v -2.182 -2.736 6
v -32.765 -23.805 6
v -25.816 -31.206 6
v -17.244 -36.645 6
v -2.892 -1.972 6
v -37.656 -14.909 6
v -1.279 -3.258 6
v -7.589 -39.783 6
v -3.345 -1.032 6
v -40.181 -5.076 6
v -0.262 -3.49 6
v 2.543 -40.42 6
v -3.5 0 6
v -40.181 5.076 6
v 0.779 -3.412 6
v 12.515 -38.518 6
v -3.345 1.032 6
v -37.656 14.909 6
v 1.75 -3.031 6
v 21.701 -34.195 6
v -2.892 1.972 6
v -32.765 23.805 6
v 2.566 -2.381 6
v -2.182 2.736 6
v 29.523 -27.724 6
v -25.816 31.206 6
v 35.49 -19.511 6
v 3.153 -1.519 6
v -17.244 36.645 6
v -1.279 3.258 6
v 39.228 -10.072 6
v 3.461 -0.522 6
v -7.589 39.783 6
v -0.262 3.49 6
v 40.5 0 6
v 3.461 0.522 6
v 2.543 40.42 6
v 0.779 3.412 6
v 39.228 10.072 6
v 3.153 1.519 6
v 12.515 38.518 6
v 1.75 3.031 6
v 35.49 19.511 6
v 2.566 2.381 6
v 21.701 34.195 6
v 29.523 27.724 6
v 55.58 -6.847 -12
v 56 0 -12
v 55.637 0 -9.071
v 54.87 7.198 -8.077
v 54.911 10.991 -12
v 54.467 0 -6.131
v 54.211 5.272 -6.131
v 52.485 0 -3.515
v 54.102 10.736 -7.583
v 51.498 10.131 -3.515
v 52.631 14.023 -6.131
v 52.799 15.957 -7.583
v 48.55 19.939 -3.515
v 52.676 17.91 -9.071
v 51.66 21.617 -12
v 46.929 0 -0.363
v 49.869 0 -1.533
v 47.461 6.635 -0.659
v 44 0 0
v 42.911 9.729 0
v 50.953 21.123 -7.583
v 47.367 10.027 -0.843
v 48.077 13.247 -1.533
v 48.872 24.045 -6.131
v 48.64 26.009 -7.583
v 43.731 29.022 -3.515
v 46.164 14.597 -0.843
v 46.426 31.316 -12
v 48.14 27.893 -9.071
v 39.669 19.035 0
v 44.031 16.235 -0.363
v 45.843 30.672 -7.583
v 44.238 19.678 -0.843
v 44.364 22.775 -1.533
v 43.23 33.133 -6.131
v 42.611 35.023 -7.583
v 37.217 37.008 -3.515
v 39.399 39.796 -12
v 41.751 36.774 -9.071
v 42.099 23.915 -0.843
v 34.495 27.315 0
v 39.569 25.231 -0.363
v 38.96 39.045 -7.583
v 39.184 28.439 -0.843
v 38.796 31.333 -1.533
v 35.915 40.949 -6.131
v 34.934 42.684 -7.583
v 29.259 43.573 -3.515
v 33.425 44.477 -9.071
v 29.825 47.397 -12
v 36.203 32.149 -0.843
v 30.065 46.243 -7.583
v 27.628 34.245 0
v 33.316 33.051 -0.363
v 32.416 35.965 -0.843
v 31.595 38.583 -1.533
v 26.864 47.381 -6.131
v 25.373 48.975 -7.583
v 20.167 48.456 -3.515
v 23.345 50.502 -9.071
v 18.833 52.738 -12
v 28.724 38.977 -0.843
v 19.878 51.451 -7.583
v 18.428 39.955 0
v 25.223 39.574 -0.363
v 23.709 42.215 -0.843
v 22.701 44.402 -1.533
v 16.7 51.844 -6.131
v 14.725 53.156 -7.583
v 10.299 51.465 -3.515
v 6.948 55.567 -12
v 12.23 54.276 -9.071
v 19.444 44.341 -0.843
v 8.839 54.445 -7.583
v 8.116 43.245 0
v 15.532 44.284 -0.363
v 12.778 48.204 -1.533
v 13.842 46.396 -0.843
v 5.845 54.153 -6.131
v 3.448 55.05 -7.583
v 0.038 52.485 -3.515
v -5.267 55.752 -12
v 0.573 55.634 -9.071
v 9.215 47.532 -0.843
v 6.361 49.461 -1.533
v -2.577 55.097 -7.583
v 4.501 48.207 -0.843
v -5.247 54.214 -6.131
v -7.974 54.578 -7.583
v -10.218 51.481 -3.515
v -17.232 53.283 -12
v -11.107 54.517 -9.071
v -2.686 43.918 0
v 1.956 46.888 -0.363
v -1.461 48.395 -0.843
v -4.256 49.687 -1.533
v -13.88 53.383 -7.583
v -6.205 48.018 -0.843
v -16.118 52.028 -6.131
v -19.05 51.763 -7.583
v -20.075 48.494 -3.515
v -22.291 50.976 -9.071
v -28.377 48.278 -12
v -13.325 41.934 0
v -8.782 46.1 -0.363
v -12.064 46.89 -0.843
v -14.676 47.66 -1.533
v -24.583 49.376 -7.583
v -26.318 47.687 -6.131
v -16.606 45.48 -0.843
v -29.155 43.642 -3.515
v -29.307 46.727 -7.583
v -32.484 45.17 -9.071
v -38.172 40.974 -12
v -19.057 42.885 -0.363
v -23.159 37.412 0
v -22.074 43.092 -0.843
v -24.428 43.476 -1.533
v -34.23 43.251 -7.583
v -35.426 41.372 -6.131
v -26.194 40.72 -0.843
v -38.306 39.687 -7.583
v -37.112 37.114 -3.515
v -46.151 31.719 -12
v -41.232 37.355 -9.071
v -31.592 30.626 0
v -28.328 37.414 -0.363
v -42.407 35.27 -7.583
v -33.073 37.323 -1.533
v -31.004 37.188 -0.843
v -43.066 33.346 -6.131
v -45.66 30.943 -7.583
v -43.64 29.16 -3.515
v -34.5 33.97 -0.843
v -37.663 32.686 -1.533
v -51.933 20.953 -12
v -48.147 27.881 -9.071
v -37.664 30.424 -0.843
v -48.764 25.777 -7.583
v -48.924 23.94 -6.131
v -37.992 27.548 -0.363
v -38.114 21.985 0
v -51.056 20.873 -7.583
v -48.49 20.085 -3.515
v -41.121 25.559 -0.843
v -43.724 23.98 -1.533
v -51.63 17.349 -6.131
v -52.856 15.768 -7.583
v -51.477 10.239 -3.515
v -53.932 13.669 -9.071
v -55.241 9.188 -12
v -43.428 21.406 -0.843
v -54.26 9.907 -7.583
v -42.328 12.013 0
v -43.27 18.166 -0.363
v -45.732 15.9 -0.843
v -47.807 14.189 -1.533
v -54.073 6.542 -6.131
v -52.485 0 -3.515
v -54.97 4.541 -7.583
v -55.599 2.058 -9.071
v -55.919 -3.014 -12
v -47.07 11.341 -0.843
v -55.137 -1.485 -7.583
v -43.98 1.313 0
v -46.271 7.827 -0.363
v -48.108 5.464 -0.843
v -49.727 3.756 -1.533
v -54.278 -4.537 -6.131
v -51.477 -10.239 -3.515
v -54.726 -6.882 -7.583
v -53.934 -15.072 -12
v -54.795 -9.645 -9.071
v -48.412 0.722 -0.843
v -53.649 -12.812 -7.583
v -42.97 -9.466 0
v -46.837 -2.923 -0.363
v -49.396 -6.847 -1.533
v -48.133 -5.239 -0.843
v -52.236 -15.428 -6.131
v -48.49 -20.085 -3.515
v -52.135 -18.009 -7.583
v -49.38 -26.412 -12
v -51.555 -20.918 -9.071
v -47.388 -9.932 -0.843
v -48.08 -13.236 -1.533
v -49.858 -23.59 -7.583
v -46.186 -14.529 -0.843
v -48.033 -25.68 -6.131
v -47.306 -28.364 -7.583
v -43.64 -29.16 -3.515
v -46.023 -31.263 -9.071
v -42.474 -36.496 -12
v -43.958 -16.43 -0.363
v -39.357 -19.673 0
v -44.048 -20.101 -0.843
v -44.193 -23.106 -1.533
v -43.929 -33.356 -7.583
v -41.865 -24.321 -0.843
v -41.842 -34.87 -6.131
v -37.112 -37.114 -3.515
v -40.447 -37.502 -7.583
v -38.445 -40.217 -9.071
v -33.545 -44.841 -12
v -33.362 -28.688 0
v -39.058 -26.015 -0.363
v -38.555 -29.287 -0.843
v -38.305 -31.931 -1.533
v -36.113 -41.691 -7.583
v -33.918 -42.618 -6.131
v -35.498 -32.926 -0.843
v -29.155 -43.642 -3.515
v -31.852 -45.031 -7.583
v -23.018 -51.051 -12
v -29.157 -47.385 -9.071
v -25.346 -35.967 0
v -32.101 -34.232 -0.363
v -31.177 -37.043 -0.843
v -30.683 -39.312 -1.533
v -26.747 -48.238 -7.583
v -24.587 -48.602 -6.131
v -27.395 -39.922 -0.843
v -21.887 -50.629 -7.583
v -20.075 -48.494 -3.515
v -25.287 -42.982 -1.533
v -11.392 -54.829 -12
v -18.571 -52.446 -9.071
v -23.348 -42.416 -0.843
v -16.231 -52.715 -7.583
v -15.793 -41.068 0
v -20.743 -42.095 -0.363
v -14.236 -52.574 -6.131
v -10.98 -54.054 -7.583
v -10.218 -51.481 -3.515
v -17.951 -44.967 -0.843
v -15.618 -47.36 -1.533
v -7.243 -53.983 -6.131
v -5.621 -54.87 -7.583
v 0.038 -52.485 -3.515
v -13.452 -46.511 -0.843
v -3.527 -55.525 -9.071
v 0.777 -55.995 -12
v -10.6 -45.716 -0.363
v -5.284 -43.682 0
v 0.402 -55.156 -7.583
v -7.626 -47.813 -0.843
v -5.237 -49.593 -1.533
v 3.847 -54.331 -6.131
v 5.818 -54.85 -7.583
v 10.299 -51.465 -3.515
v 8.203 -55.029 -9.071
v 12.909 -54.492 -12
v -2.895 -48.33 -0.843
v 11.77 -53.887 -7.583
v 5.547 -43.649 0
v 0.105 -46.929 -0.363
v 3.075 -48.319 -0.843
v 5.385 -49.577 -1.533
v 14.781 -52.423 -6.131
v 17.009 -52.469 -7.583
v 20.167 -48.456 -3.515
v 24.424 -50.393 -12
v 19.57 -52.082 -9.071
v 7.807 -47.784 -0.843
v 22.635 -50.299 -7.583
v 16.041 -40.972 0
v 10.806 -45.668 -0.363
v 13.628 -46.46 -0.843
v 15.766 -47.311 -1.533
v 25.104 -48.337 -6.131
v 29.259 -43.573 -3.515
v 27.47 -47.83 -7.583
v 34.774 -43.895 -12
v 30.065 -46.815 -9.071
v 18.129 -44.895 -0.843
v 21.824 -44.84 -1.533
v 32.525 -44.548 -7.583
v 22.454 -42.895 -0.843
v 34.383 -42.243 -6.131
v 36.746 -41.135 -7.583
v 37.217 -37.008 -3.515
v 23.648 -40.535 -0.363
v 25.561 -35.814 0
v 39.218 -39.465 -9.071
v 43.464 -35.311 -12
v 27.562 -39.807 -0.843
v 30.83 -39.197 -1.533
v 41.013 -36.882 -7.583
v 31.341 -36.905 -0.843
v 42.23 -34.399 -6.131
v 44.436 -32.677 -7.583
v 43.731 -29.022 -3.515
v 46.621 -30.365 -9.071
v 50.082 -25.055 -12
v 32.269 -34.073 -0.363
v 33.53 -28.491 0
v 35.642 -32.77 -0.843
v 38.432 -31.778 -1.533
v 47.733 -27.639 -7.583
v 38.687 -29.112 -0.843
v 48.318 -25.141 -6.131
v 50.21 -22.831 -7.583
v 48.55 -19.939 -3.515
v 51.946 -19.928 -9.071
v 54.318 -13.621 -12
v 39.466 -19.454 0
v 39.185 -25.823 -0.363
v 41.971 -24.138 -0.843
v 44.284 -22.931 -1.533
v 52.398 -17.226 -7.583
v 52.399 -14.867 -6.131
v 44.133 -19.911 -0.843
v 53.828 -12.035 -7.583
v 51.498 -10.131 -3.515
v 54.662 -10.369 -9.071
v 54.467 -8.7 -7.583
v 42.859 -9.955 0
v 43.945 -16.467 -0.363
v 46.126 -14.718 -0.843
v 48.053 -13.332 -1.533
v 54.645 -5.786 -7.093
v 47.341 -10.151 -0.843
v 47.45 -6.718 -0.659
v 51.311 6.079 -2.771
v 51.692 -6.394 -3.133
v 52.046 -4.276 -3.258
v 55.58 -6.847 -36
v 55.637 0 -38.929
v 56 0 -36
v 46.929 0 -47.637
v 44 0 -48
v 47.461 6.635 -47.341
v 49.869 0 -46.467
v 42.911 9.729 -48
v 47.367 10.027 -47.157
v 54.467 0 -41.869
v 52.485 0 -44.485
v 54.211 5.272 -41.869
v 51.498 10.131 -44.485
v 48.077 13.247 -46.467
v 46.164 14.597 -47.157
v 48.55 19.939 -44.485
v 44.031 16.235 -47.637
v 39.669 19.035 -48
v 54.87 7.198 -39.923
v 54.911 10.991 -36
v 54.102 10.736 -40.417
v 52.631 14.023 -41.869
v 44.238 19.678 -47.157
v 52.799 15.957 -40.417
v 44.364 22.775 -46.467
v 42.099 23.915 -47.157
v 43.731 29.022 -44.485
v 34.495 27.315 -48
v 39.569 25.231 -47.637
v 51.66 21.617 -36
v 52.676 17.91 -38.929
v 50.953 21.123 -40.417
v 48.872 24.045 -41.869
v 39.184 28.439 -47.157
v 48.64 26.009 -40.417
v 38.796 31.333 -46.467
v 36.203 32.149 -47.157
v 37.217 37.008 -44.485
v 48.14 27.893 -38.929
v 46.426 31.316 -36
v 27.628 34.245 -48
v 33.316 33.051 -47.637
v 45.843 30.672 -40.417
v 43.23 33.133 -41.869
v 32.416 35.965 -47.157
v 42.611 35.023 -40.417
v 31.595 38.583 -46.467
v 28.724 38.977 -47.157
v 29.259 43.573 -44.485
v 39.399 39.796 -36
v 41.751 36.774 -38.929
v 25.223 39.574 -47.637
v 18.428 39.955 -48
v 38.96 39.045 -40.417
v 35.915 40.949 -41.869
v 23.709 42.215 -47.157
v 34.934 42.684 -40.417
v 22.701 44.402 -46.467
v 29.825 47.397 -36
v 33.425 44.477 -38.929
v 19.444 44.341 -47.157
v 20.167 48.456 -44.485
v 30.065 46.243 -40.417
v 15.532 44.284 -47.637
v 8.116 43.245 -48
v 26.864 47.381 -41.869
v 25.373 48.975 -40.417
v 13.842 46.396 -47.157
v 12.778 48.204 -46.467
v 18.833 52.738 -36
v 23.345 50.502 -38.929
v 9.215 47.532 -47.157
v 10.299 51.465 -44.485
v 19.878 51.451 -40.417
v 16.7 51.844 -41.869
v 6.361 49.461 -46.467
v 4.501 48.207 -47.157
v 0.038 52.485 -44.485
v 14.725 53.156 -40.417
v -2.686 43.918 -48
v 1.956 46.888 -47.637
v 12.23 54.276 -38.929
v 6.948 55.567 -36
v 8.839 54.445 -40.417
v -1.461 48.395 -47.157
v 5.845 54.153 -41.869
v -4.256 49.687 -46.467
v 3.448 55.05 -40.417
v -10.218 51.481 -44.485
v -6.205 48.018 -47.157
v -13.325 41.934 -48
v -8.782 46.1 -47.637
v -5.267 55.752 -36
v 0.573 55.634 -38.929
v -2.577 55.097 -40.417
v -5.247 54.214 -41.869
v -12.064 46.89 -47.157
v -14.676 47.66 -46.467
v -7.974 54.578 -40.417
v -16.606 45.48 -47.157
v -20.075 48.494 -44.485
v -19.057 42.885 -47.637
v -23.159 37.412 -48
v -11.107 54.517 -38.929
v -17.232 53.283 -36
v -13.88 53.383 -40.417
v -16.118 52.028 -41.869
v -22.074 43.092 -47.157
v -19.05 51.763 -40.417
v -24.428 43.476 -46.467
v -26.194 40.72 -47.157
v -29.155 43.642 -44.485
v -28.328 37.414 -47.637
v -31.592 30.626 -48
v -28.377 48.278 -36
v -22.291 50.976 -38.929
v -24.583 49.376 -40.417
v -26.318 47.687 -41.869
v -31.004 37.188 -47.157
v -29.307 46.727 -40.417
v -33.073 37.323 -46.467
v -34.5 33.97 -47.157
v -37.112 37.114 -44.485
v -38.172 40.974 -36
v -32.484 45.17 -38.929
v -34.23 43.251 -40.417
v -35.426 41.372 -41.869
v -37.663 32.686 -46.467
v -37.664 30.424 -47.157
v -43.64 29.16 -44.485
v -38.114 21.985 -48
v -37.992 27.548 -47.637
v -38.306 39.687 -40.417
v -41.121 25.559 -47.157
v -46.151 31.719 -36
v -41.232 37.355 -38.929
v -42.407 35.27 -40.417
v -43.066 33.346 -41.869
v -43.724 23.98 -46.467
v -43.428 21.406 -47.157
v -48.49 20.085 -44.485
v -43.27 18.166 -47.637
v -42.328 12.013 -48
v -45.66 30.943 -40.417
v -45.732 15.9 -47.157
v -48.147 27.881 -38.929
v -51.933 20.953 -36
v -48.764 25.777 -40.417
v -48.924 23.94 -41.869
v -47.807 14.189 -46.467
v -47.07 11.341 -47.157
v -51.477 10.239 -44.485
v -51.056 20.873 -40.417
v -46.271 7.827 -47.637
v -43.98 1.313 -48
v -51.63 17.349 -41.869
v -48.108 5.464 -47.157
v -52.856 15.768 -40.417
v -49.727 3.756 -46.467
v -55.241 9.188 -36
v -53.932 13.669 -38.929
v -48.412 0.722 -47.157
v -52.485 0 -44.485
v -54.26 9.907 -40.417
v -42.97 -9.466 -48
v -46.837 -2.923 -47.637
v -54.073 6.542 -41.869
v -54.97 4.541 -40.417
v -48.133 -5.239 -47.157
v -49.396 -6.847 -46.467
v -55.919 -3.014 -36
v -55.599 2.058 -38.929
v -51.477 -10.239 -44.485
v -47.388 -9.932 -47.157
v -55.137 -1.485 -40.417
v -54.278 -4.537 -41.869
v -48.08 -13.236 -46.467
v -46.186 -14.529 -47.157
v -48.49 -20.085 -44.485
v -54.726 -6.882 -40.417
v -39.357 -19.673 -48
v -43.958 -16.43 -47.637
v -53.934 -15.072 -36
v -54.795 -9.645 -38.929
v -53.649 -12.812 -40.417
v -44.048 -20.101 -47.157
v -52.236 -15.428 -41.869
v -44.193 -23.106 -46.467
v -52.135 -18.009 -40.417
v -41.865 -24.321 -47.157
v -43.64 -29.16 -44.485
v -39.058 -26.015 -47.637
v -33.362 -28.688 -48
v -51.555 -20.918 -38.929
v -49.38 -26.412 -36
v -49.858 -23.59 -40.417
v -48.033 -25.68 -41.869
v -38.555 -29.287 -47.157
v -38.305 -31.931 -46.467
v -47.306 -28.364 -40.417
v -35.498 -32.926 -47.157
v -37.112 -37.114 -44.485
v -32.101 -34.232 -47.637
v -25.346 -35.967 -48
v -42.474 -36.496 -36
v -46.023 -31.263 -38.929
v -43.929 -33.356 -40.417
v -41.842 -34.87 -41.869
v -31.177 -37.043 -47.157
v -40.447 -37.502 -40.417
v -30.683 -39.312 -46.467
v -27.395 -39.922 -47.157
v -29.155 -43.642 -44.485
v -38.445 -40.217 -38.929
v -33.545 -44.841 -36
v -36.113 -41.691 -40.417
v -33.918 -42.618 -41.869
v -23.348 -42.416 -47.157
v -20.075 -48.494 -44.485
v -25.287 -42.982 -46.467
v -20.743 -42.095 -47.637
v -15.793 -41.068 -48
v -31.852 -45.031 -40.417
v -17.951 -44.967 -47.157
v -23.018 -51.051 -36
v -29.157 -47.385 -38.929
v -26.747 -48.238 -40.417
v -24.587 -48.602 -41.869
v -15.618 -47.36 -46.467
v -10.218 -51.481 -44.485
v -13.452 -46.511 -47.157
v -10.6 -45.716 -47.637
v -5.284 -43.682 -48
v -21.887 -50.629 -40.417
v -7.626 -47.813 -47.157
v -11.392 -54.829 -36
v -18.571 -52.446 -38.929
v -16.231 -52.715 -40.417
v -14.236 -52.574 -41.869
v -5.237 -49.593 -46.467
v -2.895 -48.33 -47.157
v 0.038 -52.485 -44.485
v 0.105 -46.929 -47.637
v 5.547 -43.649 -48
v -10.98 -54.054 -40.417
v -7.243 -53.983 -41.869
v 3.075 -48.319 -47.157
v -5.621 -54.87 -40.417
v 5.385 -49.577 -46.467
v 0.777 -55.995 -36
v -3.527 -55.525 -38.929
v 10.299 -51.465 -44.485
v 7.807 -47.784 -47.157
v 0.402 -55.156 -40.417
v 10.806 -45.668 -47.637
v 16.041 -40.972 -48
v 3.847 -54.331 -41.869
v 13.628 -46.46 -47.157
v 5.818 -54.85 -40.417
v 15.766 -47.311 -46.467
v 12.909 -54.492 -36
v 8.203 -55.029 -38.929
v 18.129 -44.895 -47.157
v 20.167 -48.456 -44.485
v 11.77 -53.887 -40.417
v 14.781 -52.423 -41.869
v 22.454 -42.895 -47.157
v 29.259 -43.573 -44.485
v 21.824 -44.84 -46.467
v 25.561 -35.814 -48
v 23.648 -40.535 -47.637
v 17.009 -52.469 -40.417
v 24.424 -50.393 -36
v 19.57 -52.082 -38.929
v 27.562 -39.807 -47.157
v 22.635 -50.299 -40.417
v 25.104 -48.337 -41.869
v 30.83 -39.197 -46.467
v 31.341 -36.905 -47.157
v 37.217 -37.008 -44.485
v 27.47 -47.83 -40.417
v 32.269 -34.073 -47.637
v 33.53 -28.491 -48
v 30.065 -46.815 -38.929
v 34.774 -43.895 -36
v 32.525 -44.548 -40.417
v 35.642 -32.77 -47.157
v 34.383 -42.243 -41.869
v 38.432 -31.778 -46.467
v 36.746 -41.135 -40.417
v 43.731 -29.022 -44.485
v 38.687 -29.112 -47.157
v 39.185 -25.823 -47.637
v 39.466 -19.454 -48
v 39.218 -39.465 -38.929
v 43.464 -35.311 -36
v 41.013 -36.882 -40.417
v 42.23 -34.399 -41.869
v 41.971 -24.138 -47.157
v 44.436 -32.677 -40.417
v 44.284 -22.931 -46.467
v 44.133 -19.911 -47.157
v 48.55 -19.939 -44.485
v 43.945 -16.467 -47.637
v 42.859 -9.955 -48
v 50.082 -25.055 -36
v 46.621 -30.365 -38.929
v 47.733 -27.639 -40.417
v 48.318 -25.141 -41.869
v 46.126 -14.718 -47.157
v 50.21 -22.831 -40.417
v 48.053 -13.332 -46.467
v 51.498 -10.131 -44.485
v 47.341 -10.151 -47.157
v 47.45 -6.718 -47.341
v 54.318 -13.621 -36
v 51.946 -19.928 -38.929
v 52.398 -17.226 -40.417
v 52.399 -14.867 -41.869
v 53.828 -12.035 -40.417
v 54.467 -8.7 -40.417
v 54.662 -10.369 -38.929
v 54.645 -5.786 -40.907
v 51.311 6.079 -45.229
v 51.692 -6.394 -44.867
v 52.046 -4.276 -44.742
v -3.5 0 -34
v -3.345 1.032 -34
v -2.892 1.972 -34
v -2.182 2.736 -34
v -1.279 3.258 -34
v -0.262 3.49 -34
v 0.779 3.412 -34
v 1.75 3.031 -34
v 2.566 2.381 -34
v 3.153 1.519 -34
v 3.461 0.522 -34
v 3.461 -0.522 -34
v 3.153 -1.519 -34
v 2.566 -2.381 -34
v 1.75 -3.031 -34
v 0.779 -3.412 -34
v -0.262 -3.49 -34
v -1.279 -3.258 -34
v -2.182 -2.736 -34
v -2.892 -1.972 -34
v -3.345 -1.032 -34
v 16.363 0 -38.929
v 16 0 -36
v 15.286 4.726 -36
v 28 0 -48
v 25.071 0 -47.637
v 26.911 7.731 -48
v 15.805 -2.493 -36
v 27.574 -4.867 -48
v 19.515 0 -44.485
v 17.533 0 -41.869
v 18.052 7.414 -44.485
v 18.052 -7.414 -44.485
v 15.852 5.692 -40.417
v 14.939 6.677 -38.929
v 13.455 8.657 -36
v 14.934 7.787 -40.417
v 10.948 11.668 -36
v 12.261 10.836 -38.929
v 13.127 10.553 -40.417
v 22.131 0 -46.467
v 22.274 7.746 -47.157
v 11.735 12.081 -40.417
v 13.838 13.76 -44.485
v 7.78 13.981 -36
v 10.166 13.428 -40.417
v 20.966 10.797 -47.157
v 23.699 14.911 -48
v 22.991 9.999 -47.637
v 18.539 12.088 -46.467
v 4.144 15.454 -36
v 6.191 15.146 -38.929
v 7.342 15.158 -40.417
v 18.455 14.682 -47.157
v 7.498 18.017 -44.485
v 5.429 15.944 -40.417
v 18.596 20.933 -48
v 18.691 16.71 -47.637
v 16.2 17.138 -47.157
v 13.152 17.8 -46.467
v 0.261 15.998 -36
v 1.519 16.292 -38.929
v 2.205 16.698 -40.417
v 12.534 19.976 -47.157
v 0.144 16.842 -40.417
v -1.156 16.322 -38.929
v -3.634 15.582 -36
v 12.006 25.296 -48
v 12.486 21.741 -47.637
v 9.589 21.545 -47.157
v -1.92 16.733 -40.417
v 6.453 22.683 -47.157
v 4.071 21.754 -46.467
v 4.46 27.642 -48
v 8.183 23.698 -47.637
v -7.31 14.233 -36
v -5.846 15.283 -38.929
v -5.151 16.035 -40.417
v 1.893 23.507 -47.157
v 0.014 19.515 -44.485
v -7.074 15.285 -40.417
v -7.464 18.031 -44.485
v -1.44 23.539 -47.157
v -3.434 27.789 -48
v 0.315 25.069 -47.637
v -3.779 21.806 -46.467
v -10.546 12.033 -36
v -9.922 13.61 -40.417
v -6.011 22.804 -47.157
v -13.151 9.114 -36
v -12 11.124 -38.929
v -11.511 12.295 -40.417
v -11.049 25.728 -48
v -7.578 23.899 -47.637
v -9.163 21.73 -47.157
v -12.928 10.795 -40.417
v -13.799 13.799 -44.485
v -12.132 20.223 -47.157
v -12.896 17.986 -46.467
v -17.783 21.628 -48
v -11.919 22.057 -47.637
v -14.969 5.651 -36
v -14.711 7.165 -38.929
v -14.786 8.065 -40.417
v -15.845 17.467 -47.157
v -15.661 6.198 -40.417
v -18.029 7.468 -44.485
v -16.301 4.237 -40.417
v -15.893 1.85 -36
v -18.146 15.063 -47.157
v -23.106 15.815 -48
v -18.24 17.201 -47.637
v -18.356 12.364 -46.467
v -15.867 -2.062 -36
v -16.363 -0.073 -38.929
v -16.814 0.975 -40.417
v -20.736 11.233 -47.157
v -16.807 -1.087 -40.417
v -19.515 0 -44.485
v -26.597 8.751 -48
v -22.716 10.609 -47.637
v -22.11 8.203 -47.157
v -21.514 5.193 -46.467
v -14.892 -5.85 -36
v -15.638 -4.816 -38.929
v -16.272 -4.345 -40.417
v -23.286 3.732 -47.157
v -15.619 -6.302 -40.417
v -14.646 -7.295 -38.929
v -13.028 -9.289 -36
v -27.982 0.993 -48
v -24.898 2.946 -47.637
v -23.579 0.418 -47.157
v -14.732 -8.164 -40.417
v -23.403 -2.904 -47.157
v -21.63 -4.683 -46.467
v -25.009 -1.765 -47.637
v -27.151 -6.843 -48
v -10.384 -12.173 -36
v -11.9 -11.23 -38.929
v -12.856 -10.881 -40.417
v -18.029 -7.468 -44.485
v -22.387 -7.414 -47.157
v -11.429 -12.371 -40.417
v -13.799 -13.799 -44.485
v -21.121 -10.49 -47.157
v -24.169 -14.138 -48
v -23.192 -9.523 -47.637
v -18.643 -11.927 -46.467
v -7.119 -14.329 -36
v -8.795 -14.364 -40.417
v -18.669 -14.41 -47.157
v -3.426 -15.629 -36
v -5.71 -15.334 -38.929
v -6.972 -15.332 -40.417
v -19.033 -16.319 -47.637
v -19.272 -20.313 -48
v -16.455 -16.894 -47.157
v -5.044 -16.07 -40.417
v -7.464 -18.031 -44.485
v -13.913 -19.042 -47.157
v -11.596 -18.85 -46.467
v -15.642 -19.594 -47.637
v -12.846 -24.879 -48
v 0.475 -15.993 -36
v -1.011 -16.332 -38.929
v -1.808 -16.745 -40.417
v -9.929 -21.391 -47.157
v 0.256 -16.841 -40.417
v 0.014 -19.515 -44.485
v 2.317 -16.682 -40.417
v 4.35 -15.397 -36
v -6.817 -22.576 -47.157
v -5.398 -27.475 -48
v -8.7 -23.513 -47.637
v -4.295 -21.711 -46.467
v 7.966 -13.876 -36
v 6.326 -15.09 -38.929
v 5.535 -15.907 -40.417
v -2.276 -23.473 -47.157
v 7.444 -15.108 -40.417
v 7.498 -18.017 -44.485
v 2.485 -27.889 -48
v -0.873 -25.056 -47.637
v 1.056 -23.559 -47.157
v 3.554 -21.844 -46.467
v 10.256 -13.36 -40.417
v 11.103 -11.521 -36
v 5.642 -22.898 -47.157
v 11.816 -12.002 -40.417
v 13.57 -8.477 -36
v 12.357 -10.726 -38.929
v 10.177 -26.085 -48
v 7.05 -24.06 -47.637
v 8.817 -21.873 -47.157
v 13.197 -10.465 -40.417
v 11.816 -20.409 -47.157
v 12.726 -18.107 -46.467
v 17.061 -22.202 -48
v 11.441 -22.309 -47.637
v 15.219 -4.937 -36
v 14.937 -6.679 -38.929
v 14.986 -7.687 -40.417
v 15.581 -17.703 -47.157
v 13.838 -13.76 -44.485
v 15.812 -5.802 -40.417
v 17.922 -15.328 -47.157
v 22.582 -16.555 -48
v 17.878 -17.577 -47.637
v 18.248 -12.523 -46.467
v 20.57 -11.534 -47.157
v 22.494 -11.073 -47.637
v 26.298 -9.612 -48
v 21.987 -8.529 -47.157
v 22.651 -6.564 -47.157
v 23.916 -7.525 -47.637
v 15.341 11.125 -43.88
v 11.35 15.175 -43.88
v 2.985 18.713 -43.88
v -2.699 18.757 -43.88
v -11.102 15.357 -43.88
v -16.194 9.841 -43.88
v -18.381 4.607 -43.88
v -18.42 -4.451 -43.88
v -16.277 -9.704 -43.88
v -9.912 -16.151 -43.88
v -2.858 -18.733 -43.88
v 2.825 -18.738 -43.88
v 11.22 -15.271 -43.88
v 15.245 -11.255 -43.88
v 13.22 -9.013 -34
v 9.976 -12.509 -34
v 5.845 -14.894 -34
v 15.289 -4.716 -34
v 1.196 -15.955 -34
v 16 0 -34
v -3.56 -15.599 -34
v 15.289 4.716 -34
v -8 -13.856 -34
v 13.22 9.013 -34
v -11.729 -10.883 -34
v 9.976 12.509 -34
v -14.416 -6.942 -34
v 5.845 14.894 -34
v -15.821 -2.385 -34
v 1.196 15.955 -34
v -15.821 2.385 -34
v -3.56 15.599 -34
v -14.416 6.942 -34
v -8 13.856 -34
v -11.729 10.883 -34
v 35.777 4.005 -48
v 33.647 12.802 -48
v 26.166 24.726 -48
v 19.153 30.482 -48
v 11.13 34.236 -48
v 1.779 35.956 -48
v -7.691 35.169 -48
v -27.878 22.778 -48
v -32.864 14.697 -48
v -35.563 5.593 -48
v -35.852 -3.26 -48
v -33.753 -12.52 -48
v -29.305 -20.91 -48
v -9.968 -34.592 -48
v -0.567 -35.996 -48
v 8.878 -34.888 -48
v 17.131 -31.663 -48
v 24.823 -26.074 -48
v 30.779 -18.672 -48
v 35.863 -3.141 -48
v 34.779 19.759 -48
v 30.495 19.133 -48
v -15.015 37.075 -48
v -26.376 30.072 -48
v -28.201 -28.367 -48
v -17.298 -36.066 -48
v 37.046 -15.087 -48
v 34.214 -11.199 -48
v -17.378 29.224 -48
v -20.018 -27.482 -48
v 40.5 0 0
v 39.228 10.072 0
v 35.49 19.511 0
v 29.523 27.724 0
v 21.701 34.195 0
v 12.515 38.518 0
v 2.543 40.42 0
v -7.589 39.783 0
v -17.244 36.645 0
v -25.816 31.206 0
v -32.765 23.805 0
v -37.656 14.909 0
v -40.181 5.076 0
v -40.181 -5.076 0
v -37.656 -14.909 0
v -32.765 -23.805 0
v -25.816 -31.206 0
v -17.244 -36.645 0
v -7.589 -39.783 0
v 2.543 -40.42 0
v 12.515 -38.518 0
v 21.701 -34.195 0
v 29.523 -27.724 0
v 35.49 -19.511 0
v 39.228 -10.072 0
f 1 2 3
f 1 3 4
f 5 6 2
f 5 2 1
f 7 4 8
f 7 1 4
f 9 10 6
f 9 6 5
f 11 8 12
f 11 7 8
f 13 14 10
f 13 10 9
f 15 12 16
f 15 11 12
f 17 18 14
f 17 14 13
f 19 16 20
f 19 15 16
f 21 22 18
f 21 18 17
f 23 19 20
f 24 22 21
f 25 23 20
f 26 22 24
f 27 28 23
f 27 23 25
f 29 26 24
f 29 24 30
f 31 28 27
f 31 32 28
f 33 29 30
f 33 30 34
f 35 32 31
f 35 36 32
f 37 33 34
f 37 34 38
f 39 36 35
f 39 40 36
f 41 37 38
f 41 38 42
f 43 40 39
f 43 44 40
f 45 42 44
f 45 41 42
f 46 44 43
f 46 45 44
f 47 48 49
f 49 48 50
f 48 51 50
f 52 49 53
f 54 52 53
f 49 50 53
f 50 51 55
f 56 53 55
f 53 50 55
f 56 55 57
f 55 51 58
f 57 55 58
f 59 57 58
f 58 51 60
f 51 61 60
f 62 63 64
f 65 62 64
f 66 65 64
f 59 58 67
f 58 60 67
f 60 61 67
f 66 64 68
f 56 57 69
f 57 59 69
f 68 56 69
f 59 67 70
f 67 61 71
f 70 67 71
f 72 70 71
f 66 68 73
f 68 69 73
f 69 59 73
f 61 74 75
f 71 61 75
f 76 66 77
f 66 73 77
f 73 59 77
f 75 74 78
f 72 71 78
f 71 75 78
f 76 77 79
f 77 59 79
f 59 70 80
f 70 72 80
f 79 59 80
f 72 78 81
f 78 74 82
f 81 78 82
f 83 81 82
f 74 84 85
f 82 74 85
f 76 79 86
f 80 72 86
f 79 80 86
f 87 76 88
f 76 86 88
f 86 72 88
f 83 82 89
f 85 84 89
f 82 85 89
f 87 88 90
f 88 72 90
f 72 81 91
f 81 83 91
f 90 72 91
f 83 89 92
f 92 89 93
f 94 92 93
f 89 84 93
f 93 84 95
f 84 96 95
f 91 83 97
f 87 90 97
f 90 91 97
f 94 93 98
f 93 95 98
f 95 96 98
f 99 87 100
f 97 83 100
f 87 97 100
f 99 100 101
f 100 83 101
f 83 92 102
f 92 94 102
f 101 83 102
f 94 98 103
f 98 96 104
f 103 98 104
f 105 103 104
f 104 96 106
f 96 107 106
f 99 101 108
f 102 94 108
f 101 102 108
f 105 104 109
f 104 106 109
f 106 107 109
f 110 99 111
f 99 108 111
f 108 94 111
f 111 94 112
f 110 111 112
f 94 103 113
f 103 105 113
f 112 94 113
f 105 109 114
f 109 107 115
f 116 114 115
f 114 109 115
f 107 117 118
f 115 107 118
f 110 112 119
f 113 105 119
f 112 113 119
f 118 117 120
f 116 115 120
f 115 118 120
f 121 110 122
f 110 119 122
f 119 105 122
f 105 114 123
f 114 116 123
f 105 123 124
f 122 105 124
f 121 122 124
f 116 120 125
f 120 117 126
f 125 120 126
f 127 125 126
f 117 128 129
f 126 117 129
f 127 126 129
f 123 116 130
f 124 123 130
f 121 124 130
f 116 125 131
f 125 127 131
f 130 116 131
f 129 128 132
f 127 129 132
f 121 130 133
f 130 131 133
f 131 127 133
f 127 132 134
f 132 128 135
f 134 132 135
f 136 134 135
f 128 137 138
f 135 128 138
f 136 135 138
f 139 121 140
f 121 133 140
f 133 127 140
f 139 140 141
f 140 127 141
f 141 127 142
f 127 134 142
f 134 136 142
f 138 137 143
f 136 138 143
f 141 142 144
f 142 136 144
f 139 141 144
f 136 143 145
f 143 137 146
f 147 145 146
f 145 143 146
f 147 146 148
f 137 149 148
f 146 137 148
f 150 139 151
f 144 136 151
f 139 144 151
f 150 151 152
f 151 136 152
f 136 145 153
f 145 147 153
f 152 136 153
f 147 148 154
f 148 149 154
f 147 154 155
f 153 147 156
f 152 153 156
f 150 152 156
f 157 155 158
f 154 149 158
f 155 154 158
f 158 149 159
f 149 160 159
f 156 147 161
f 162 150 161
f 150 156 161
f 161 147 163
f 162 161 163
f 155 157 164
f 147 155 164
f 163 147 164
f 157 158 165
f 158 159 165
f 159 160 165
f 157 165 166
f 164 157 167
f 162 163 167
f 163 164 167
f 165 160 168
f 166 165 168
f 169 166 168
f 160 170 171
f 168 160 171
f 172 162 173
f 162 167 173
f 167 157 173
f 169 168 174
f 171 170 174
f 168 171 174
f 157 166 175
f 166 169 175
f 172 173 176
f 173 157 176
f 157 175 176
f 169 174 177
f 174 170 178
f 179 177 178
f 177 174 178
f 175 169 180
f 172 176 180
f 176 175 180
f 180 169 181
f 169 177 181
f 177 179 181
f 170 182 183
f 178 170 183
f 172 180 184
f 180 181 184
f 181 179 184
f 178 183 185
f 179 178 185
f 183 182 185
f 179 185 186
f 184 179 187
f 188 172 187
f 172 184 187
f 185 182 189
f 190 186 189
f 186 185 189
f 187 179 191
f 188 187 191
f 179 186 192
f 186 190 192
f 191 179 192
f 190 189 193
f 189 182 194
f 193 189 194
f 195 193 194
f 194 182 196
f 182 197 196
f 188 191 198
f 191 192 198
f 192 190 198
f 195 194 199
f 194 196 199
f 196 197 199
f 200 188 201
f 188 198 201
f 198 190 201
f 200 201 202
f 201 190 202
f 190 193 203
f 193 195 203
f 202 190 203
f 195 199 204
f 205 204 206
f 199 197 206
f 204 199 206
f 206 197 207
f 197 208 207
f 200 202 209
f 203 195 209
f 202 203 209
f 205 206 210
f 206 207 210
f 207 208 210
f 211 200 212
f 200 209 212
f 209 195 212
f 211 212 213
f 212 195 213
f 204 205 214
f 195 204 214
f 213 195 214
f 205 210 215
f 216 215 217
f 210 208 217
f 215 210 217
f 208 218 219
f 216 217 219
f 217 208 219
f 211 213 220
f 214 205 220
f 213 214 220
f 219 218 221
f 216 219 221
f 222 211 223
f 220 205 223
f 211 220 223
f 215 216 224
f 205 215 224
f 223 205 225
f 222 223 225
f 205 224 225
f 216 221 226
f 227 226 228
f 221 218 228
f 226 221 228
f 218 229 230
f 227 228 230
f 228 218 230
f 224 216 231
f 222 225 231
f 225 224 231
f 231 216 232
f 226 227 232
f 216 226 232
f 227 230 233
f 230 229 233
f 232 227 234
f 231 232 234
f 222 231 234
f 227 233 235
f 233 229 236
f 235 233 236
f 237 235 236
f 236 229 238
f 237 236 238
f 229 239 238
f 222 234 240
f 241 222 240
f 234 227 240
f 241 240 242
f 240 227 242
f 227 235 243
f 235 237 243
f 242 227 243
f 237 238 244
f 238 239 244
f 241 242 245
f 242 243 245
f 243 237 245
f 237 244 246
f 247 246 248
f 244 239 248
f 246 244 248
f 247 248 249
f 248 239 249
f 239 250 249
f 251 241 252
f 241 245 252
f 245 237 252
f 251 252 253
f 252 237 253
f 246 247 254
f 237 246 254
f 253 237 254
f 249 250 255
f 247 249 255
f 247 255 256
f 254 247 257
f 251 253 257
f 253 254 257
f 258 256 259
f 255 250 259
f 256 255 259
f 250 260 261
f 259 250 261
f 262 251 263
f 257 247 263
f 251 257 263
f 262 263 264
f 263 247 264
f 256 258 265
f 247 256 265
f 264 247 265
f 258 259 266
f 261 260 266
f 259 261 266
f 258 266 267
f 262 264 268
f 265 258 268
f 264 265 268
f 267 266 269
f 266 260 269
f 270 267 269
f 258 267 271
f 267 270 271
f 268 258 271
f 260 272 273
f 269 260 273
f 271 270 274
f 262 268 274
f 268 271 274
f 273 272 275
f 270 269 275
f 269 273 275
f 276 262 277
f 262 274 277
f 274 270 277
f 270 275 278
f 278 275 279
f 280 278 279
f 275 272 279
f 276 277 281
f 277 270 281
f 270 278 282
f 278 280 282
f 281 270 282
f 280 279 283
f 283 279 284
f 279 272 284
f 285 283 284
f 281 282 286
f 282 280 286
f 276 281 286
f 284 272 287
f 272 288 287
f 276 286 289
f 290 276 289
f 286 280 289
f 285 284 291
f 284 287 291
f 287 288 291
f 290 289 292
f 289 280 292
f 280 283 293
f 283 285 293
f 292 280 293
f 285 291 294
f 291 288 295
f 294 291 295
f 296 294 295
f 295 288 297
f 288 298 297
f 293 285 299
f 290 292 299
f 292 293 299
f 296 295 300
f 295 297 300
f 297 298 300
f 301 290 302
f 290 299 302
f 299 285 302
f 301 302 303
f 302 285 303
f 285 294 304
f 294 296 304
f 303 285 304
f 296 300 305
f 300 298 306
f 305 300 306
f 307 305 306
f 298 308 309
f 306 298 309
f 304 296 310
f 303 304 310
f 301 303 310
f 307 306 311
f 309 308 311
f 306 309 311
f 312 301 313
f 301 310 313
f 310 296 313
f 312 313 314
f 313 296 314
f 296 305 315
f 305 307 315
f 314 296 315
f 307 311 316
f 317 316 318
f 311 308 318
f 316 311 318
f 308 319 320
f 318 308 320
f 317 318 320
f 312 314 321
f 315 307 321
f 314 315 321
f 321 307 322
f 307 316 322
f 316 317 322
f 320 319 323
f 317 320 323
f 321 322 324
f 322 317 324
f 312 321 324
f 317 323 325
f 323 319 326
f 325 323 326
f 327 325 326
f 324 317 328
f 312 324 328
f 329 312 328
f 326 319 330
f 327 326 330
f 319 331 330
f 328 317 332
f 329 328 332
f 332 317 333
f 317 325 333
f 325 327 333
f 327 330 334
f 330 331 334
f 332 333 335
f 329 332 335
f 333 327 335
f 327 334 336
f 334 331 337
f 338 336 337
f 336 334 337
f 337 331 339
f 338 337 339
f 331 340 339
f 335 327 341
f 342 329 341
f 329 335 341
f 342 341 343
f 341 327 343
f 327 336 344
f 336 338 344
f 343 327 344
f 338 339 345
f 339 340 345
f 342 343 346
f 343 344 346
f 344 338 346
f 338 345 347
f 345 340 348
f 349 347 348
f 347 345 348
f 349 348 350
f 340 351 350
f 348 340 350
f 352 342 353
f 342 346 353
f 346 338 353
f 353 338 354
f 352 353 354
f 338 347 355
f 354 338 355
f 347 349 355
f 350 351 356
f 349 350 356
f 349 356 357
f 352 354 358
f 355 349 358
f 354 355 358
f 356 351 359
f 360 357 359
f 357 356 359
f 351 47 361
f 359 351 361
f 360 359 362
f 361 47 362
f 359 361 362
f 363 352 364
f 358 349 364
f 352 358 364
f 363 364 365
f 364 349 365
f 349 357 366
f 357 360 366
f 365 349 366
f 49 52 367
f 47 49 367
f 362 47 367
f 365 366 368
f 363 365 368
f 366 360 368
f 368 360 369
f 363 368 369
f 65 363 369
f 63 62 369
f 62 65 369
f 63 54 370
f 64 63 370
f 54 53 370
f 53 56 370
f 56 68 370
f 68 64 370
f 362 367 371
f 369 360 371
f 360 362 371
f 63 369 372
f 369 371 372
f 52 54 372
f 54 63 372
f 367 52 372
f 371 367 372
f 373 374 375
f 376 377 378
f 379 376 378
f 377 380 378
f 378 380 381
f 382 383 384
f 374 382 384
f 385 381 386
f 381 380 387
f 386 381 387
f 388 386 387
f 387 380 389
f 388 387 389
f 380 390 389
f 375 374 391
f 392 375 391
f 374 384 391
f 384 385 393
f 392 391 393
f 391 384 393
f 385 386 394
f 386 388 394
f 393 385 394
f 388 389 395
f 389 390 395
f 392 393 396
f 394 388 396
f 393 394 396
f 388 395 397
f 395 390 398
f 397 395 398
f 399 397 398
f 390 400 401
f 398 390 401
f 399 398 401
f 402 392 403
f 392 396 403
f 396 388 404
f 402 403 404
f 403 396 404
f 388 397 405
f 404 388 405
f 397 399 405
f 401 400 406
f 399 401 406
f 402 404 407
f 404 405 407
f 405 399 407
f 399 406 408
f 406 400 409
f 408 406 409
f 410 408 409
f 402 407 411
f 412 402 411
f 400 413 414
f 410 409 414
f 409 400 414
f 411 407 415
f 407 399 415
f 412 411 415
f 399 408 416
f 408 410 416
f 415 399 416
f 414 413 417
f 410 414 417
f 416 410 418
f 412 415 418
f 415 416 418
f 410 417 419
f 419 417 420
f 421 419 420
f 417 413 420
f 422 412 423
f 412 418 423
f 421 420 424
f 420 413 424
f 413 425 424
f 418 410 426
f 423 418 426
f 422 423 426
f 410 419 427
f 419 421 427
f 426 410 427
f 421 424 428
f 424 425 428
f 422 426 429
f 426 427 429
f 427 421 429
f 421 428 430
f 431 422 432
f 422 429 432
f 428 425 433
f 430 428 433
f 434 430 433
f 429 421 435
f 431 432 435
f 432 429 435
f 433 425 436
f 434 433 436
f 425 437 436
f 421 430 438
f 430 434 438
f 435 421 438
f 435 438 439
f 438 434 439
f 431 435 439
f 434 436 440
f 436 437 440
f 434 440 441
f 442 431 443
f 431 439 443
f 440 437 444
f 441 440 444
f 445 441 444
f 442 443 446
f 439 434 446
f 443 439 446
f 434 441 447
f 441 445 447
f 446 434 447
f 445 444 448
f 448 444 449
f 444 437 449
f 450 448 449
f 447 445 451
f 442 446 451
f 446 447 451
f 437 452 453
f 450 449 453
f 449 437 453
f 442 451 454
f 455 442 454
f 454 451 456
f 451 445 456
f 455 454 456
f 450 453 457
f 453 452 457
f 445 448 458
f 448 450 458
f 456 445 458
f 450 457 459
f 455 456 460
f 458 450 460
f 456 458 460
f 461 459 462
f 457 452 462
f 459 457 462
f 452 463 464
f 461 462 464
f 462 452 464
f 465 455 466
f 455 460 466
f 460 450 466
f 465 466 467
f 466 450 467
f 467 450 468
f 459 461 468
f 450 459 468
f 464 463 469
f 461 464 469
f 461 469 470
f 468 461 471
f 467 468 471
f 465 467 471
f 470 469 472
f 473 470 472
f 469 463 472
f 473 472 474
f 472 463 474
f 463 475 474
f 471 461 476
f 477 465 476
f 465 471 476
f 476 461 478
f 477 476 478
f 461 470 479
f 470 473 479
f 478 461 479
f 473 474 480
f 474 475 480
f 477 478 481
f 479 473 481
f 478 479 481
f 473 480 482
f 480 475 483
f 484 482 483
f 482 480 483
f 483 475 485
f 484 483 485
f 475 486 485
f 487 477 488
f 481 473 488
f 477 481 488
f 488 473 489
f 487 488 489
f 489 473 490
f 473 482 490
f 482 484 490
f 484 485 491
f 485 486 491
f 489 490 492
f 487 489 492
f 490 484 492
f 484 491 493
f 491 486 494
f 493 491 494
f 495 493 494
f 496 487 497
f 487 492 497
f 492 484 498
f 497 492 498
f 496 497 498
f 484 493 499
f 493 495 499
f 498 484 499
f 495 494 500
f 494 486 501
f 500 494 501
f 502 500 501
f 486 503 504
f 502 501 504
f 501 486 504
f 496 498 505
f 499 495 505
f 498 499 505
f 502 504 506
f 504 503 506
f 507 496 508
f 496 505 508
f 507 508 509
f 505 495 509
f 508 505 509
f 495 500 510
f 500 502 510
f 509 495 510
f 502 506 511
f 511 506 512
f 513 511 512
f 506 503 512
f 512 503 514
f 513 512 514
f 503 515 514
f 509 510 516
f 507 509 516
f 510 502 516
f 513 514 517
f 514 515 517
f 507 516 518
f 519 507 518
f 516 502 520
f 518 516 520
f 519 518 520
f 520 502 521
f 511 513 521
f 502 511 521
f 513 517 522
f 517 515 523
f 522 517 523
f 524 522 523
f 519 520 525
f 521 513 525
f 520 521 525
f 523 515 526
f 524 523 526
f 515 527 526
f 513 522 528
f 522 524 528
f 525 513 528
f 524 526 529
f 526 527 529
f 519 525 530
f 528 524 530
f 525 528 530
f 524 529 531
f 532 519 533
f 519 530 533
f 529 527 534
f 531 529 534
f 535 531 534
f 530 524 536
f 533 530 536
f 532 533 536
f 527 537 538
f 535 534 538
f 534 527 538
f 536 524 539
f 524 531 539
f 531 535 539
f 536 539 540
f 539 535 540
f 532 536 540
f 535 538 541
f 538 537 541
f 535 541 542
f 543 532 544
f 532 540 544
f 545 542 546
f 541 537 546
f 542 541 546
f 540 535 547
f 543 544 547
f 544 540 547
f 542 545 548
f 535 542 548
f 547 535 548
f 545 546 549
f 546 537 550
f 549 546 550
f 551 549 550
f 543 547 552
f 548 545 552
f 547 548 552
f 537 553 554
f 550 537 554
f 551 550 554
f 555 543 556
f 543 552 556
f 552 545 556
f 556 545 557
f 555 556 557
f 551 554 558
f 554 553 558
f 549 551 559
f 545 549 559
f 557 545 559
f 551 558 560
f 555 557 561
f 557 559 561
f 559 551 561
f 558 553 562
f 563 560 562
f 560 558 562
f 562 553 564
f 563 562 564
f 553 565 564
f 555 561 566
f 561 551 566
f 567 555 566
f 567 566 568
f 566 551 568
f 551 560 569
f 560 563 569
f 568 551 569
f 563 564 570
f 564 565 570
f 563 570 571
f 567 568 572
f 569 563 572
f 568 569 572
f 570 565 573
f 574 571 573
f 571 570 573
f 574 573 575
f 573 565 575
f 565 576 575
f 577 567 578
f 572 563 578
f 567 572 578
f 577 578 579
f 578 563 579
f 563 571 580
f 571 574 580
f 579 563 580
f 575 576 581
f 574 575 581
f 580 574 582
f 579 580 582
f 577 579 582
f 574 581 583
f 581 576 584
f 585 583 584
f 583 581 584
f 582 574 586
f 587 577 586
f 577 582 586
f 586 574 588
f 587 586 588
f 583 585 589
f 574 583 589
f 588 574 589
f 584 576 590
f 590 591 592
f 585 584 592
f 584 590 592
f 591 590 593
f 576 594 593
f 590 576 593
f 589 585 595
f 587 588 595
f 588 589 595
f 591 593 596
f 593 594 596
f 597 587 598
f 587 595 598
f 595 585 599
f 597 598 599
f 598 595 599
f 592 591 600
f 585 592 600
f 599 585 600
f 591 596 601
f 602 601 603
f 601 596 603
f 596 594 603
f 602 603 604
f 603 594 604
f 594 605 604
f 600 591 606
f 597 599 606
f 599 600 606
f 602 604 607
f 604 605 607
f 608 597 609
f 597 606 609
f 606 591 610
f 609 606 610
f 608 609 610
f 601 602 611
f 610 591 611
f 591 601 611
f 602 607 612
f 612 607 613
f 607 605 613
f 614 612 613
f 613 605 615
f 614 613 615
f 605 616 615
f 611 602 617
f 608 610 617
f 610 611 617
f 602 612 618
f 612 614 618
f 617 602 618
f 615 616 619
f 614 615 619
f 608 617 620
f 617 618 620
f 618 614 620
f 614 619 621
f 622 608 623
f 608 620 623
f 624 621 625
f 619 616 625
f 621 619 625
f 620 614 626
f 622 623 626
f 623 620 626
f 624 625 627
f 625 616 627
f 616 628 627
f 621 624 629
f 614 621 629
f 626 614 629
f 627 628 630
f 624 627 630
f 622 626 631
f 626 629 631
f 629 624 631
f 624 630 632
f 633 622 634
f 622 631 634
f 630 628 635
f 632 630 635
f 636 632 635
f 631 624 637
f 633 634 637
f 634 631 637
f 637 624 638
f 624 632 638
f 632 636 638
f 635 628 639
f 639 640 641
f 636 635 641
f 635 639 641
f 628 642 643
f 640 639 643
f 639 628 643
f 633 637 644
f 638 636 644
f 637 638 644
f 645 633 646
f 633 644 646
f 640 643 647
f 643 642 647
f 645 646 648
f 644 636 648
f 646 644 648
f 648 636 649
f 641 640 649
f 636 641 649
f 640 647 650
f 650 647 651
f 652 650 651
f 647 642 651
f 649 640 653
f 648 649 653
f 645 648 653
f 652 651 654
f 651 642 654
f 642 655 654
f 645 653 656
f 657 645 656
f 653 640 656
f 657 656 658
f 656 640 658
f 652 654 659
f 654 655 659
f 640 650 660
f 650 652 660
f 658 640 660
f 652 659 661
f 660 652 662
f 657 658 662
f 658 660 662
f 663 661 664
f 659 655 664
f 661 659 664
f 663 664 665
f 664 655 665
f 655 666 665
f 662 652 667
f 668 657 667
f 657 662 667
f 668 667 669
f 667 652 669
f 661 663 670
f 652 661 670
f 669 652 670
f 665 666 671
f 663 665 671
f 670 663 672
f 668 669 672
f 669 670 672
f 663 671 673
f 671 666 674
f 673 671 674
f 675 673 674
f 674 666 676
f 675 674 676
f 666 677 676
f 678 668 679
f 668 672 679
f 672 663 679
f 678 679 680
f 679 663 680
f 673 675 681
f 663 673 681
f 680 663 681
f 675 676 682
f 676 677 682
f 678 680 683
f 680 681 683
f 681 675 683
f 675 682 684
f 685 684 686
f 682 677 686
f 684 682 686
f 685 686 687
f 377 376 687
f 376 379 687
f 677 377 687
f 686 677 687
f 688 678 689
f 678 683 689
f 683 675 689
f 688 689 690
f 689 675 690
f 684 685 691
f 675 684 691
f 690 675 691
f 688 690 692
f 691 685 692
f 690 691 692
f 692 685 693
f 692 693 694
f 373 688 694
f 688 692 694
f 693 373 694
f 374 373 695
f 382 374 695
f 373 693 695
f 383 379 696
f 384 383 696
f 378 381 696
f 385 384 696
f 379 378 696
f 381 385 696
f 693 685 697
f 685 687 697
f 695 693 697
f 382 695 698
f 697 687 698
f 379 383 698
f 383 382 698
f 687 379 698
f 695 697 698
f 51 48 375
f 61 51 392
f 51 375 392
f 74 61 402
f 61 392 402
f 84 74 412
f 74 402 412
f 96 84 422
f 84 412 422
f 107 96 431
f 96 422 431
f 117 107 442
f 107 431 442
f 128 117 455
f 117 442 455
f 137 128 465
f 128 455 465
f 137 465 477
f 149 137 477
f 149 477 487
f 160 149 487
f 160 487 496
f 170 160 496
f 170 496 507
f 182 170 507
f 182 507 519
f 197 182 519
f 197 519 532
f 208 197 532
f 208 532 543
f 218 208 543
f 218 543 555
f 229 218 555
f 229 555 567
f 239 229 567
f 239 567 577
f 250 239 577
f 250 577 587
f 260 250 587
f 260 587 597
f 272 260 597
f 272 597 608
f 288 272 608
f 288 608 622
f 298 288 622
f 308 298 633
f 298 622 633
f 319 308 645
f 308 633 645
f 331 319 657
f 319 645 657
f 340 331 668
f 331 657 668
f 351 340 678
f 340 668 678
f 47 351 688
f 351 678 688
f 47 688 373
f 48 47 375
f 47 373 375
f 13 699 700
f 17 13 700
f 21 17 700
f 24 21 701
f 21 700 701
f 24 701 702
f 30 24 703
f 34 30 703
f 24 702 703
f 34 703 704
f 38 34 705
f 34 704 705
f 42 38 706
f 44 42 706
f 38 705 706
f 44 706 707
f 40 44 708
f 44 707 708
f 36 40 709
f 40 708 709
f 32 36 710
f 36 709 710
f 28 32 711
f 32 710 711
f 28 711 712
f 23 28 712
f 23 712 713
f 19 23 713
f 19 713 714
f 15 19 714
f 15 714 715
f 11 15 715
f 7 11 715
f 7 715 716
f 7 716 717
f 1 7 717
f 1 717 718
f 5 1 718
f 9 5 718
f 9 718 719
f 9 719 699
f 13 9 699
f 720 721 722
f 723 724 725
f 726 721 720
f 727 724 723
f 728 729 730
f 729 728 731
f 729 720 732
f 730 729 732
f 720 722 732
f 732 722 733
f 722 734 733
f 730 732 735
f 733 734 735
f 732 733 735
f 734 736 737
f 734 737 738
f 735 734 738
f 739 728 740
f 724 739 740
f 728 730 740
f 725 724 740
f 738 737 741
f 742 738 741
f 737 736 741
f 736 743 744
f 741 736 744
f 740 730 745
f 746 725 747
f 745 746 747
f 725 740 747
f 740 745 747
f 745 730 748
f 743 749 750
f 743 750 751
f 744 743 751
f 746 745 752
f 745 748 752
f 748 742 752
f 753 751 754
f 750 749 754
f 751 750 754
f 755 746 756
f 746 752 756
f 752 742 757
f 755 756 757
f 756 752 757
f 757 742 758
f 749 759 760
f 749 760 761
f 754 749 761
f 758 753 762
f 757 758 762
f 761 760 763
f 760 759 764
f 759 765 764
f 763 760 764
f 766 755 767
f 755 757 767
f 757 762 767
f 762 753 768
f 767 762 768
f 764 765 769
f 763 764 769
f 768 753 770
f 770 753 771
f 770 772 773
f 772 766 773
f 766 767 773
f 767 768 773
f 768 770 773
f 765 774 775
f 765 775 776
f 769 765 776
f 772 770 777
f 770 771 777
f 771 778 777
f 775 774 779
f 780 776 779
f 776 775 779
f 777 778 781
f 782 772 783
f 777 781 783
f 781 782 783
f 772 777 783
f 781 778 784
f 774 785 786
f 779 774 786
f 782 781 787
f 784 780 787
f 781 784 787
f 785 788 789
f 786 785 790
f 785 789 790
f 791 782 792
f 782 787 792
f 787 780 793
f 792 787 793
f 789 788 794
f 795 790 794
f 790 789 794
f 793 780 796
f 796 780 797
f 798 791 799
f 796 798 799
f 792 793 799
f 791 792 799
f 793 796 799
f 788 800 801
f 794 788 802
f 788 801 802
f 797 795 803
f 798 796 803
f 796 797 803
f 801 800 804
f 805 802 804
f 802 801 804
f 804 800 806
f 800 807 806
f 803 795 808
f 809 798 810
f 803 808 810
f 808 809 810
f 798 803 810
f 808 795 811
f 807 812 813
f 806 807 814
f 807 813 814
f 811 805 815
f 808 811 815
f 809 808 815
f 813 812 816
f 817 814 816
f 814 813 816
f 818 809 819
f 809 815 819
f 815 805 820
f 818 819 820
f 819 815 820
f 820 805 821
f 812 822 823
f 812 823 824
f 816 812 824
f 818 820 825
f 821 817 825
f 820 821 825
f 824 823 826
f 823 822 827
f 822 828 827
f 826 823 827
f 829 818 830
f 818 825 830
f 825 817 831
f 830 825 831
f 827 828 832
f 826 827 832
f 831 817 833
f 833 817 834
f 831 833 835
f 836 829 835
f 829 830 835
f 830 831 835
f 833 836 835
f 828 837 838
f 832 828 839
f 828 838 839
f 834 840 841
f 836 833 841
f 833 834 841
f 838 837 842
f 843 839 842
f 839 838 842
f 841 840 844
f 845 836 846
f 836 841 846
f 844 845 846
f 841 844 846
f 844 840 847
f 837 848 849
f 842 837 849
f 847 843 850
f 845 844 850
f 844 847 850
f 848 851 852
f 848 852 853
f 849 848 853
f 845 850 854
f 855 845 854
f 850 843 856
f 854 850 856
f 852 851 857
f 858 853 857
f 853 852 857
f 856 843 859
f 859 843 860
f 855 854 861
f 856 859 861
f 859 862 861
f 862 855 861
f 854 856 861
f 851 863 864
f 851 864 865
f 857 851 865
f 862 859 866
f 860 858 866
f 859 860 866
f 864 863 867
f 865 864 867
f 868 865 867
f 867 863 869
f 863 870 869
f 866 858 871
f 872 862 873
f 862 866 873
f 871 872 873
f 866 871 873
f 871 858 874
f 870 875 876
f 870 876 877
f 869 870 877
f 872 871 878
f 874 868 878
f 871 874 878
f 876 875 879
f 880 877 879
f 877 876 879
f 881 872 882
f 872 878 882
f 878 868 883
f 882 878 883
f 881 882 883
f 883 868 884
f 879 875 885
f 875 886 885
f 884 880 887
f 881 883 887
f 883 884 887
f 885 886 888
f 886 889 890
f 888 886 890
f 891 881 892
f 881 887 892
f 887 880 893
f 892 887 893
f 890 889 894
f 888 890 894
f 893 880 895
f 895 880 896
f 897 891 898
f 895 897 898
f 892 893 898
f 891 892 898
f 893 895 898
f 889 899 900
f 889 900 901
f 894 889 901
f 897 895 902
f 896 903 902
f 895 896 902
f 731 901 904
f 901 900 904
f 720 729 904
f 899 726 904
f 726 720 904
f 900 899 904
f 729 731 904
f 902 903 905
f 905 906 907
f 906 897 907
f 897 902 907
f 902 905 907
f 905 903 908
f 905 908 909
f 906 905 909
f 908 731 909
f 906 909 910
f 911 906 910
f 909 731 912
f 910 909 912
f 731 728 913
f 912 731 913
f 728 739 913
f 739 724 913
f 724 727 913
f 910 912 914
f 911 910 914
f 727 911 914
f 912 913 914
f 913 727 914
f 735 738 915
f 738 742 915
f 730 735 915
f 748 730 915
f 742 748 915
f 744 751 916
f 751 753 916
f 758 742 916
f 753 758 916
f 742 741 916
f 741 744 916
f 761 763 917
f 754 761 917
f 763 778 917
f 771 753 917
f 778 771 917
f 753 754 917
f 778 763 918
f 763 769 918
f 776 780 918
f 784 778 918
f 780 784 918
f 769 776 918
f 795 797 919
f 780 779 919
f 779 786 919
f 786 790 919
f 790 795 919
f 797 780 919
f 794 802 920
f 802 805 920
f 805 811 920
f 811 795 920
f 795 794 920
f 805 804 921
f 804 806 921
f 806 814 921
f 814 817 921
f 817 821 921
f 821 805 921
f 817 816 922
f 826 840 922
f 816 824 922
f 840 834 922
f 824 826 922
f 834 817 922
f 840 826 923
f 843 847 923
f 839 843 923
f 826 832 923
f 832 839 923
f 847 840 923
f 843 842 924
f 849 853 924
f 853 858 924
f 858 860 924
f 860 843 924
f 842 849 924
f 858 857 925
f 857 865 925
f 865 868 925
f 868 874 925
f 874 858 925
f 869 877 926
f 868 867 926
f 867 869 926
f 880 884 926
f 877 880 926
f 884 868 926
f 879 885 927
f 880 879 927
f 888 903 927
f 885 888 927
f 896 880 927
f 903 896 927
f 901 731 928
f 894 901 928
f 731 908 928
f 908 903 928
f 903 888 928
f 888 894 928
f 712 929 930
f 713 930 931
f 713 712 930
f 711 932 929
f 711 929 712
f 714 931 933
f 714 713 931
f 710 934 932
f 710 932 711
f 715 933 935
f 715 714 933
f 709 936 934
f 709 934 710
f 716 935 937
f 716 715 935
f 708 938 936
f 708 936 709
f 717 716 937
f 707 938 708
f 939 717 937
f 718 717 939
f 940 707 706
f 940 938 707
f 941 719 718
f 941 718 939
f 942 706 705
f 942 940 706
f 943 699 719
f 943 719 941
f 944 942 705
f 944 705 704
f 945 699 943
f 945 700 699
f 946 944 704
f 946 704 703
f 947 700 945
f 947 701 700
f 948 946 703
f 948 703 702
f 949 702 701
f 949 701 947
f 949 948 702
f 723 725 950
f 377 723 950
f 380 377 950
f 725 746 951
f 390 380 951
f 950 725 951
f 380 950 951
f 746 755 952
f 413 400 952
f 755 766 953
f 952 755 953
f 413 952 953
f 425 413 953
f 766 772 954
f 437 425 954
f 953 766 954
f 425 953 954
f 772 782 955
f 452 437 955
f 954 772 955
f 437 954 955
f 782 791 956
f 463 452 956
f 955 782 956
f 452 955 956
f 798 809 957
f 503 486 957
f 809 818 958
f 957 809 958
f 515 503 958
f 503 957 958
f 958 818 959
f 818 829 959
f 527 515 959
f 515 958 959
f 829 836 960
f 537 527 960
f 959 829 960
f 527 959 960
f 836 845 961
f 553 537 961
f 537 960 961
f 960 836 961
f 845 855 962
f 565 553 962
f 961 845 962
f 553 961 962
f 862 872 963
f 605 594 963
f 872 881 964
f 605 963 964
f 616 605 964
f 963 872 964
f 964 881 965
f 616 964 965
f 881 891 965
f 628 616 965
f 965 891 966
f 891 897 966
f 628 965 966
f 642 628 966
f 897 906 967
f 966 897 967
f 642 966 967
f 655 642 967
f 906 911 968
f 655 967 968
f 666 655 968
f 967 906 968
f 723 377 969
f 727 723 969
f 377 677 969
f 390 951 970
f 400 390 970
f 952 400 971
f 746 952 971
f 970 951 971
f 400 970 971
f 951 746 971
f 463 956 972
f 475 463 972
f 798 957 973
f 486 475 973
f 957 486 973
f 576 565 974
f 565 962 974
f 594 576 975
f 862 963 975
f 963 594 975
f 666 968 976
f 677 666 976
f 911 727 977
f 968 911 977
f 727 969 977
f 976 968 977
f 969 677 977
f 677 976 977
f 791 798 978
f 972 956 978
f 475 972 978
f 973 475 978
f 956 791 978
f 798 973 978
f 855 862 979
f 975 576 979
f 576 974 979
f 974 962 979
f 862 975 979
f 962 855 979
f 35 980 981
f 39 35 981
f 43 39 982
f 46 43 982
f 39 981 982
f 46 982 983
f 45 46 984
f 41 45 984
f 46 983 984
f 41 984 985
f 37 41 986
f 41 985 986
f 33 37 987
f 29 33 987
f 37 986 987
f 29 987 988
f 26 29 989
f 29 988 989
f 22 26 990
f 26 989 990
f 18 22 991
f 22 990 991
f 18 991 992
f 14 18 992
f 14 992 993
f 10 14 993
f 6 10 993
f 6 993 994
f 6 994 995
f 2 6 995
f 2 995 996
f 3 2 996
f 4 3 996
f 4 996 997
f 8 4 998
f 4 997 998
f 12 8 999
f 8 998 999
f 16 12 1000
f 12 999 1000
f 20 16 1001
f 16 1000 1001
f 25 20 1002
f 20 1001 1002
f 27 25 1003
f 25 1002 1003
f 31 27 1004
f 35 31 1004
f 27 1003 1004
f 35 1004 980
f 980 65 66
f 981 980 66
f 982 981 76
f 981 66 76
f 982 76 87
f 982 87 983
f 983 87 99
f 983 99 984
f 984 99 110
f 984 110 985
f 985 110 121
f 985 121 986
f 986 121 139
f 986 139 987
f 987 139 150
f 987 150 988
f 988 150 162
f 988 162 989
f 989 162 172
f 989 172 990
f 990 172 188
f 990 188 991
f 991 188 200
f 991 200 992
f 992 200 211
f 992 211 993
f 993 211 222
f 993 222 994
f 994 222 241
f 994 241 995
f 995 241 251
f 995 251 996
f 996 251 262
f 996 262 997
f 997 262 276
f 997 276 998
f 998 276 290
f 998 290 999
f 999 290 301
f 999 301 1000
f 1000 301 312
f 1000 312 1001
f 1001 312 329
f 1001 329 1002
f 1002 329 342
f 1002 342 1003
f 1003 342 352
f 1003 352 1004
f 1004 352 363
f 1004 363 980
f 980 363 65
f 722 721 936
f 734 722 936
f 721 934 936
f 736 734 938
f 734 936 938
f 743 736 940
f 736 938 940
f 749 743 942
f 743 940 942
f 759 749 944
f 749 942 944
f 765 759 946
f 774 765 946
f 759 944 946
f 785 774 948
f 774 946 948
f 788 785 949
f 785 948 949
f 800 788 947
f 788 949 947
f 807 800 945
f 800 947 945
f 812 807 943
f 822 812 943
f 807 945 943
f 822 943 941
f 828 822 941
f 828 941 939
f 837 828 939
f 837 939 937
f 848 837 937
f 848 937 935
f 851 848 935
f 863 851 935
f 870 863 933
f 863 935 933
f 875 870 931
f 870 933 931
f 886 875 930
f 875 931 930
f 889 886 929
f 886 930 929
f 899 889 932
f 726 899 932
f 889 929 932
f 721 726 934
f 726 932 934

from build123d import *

# Parameters (mm, degrees)
SKETCH1_R               = 40.5
BOSS_EXTRUDE1_DEPTH     = 6
SKETCH2_W               = 40
SKETCH2_H               = 48
FILLET1_R               = 12
SKETCH4_R               = 16
BOSS_EXTRUDE2_DEPTH     = 34
SKETCH5_R               = 3.5
CUT_EXTRUDE1_DEPTH      = 15.0000001
CUT_EXTRUDE1_DEPTH_BACK = 41


with BuildPart() as part:
    # Sketch1 → Boss-Extrude1 (new body)
    with BuildSketch(Plane.XY):
        Circle(SKETCH1_R)
    extrude(amount=BOSS_EXTRUDE1_DEPTH)

    # Sweep1: sweep along a path in Sketch3
    with BuildLine(Plane.XY.offset(-24)) as sweep1_path:
        CenterArc((0, 0), 70, 0, 360)
    # Sketch2 → Sweep1 (sweep)
    with BuildSketch(Plane(origin=(0, 0, 0), x_dir=(1, 0, 0), z_dir=(0, 1, 0))):
        with Locations((36, 24)):
            Rectangle(SKETCH2_W, SKETCH2_H)
    sweep(path=sweep1_path.line)

    # Fillet1
    fillet1_edges = [part.edges().sort_by_distance(p)[0] for p in [
        (-16, 0, -48),
        (-56, 0, -48),
        (-56, 0, 0),
    ]]
    fillet(fillet1_edges, radius=FILLET1_R)

    # Sketch4 → Boss-Extrude2 (add)
    with BuildSketch(Plane(origin=(0, 0, 0), x_dir=(-1, 0, 0), z_dir=(0, 0, -1))):
        Circle(SKETCH4_R)
    extrude(amount=BOSS_EXTRUDE2_DEPTH)

    # Sketch5 → Cut-Extrude1 (cut, two sides)
    with BuildSketch(Plane(origin=(0, 0, -34), x_dir=(-1, 0, 0), z_dir=(0, 0, -1))) as cut_extrude1_sk:
        Circle(SKETCH5_R)
    extrude(amount=CUT_EXTRUDE1_DEPTH, mode=Mode.SUBTRACT)
    extrude(cut_extrude1_sk.sketch, amount=-CUT_EXTRUDE1_DEPTH_BACK, mode=Mode.SUBTRACT)


solid = part.part
